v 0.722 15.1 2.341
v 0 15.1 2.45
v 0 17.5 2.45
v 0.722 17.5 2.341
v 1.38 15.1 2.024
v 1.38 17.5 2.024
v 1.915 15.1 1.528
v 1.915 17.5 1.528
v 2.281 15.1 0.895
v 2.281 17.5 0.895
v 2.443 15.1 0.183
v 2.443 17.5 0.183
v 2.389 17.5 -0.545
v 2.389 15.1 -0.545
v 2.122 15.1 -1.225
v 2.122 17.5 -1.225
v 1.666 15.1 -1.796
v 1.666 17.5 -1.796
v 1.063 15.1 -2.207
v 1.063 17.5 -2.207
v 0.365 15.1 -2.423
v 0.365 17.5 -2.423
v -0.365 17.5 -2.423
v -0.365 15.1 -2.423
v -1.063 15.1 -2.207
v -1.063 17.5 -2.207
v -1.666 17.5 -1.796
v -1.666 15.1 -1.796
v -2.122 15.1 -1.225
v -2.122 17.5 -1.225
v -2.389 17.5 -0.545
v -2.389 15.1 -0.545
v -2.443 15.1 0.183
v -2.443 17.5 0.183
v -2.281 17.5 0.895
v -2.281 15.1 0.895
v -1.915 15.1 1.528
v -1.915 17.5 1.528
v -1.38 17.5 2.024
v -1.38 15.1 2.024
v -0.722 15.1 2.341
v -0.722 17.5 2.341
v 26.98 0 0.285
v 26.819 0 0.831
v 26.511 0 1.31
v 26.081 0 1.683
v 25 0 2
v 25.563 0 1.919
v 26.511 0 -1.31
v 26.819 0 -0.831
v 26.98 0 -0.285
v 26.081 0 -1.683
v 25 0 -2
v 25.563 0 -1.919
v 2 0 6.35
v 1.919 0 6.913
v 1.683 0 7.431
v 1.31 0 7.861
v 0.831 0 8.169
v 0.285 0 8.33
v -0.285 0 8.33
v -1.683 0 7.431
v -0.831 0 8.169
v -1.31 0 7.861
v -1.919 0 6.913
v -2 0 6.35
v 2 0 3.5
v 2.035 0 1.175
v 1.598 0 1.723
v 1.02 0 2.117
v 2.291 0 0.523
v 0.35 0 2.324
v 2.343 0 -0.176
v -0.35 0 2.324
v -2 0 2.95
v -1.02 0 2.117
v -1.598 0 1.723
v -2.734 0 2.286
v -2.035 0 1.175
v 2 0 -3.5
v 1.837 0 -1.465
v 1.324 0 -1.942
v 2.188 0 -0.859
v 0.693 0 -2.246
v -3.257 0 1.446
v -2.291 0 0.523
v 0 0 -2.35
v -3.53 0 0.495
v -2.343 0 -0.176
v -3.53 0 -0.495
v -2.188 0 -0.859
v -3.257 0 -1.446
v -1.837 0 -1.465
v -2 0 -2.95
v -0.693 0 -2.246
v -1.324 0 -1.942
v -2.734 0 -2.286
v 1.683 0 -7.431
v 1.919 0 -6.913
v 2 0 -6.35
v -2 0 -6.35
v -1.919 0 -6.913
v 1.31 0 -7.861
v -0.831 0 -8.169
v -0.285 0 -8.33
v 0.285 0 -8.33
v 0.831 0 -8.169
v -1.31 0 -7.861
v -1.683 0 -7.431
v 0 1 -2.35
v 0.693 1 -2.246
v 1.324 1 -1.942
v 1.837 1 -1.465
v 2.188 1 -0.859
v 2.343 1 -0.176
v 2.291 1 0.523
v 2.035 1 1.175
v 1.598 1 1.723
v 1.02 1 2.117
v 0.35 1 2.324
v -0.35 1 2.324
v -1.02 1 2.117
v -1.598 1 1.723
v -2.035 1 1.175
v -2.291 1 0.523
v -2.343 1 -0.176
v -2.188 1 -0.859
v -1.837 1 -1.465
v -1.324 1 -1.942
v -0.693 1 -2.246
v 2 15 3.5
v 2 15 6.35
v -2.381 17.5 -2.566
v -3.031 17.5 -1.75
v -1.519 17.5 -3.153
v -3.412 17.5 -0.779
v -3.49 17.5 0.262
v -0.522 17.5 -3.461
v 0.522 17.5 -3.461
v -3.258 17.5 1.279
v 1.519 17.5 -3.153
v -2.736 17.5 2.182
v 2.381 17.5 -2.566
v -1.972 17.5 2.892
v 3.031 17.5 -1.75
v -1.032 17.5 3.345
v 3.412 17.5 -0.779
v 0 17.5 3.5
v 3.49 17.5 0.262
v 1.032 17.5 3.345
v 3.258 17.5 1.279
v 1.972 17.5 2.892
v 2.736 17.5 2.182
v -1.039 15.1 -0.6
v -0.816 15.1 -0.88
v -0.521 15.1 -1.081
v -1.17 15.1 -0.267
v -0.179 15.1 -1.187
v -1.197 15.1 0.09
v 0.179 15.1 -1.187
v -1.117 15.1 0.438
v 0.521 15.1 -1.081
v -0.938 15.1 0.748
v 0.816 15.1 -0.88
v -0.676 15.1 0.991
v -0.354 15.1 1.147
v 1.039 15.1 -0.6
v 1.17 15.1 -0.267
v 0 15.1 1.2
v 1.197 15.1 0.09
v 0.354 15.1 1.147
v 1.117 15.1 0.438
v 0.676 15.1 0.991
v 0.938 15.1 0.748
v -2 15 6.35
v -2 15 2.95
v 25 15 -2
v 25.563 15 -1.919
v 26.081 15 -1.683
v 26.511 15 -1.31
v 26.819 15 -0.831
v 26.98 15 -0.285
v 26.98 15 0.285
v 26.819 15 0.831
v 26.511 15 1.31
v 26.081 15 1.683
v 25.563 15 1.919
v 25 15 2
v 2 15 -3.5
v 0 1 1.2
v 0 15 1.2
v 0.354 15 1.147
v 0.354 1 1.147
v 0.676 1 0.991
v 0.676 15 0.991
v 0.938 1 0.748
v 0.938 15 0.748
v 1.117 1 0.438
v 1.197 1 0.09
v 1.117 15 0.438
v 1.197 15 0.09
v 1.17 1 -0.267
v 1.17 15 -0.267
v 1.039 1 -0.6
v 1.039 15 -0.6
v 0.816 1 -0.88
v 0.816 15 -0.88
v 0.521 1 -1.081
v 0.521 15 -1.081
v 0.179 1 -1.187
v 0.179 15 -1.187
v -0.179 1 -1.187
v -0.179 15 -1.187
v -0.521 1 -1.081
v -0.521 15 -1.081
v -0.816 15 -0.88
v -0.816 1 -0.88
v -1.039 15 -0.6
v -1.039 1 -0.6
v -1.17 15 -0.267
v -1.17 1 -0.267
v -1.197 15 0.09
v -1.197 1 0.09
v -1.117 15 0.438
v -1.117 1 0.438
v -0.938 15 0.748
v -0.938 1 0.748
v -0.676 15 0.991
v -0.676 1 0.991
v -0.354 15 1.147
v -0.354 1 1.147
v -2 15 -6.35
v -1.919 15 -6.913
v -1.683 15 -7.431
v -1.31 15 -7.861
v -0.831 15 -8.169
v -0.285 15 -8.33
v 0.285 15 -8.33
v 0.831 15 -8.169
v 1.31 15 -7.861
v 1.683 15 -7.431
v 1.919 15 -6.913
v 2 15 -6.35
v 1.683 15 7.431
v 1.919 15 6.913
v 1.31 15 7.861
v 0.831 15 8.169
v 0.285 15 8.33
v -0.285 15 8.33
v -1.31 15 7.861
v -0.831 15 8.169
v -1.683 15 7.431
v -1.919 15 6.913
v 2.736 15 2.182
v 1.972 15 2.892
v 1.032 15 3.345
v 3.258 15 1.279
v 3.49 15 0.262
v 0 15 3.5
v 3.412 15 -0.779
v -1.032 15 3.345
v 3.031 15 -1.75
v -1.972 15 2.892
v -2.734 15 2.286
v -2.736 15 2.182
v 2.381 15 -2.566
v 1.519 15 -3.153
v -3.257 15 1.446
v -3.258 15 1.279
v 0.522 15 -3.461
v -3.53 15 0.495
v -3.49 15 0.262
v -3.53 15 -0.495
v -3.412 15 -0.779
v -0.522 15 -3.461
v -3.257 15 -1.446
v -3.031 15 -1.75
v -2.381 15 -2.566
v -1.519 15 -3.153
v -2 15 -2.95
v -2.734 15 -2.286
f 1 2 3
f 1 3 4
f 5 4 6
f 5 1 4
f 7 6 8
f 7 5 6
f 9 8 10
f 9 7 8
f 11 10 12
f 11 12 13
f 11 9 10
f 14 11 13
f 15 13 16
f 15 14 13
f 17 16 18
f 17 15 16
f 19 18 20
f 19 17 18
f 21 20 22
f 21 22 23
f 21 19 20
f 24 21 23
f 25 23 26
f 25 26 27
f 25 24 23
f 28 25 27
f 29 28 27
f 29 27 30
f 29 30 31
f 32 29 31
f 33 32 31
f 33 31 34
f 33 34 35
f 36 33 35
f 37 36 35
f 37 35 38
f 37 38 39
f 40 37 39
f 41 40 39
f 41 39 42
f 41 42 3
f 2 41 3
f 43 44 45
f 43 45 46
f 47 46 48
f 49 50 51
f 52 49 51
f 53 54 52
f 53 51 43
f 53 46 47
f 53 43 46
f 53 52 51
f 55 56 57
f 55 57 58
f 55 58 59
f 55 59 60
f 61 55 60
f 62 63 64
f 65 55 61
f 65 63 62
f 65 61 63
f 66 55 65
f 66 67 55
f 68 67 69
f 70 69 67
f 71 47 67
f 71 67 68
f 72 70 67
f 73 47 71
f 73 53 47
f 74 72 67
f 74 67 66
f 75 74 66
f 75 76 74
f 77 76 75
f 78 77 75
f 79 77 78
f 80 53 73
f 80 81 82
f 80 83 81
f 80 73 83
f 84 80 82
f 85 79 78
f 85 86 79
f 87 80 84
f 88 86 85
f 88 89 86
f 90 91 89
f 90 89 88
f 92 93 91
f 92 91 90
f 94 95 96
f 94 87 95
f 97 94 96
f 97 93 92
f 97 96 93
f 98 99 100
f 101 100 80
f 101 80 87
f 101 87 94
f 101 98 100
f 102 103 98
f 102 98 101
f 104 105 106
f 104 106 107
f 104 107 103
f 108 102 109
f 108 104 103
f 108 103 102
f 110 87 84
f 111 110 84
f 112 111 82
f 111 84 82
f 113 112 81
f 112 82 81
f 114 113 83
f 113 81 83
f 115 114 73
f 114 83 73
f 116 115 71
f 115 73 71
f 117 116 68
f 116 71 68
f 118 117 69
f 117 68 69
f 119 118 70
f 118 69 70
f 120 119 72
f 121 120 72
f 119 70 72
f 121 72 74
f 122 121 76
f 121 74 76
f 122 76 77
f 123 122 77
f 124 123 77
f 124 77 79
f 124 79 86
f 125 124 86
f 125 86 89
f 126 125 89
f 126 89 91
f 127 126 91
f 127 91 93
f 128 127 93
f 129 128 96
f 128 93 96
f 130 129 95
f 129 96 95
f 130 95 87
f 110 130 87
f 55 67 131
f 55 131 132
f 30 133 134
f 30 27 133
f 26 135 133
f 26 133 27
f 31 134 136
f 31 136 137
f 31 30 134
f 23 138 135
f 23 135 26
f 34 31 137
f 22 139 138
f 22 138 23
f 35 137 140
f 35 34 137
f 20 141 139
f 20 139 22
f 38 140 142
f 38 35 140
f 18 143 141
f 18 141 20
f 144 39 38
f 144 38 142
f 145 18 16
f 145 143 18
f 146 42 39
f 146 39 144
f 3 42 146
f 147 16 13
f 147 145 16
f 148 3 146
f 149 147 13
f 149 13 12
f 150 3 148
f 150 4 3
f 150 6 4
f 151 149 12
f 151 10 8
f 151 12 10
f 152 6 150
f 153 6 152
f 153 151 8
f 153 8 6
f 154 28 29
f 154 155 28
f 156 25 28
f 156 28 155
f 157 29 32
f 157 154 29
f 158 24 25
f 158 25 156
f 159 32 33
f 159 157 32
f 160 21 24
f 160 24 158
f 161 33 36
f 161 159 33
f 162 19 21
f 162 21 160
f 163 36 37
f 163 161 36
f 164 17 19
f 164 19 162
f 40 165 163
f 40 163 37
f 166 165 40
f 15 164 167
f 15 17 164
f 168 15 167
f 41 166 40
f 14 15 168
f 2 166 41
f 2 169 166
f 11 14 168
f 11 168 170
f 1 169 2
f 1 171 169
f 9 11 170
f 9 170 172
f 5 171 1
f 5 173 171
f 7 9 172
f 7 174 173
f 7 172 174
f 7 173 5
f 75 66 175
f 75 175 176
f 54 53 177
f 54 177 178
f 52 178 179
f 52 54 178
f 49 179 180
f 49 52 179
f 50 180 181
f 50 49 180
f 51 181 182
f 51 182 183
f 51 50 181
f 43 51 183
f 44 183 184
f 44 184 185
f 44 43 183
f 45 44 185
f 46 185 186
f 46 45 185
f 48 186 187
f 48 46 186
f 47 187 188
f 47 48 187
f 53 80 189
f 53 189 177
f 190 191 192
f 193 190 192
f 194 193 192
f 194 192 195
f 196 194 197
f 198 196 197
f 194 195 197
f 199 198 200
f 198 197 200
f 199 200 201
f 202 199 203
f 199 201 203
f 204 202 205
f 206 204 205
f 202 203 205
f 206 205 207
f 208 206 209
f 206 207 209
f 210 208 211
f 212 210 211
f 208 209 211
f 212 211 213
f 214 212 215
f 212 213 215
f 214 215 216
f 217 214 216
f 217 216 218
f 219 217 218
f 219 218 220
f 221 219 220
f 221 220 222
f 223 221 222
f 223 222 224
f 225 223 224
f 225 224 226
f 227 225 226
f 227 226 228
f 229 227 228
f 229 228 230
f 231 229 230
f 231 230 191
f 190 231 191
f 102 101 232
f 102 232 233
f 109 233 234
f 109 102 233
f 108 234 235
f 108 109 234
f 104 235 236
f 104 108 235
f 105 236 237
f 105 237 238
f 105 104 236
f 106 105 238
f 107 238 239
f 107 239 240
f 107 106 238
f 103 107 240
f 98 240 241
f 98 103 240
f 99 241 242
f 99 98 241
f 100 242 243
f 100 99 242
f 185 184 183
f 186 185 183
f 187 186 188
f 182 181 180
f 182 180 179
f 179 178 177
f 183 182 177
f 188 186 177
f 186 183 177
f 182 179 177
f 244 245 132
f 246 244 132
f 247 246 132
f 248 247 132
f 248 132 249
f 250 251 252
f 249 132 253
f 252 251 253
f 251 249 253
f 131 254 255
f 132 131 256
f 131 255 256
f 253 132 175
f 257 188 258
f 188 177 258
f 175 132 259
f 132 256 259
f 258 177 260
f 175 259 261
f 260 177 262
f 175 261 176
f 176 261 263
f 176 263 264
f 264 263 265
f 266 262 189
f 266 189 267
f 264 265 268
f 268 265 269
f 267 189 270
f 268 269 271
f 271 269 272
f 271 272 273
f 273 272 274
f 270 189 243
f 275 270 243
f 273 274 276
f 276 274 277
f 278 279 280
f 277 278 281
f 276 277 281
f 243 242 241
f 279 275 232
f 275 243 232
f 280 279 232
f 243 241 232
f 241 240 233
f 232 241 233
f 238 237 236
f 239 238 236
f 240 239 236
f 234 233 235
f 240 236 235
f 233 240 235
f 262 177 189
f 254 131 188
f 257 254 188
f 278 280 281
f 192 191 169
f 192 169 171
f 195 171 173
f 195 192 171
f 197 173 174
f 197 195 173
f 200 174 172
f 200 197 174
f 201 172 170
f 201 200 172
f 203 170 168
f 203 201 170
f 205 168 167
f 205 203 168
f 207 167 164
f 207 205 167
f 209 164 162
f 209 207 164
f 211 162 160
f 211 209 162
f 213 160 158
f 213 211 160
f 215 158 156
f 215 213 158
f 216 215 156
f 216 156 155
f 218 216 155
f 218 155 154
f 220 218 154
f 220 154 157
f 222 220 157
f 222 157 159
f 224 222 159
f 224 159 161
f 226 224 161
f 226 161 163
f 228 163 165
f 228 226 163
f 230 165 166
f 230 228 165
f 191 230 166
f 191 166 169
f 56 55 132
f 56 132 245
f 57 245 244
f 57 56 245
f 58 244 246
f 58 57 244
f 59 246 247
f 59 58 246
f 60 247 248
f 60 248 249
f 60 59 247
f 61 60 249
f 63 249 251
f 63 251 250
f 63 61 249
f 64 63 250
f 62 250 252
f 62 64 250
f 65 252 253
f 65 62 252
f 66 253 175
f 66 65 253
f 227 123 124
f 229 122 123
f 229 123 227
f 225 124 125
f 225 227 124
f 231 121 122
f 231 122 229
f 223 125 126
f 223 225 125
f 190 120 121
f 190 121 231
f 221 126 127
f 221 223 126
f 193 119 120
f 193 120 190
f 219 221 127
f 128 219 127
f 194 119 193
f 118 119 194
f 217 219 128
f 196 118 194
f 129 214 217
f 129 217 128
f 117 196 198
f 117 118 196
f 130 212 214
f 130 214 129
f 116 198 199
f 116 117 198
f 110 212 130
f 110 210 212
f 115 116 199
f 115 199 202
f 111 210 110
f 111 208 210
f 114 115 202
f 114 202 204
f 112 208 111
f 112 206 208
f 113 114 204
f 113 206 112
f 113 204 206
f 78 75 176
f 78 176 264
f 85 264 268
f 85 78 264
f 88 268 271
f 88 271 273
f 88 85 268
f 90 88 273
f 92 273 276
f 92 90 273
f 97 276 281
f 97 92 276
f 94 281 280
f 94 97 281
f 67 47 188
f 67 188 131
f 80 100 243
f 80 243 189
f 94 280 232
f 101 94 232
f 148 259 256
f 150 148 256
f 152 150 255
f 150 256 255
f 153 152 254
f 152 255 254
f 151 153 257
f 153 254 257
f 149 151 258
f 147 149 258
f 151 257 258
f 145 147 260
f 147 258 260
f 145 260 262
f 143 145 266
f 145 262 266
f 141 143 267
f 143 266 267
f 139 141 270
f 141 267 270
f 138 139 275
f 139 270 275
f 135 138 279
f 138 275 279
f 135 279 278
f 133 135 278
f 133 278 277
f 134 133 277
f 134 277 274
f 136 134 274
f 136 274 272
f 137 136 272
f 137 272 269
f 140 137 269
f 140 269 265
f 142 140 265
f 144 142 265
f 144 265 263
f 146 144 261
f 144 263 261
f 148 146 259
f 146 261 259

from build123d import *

# Parameters (mm, degrees)
BOSS_EXTRUDE1_DEPTH = 15
SKETCH2_R           = 2.35
CUT_EXTRUDE1_DEPTH  = 1
SKETCH3_R           = 3.5
SKETCH3_R_2         = 2.45
BOSS_EXTRUDE2_DEPTH = 2.5
SKETCH4_R           = 1.2
CUT_EXTRUDE2_DEPTH  = 32.995663769
SKETCH5_R           = 2.45
SKETCH5_R_2         = 1.2
BOSS_EXTRUDE3_DEPTH = 0.1


with BuildPart() as part:
    # Sketch1 → Boss-Extrude1 (new body)
    with BuildSketch(Plane(origin=(0, 0, 0), x_dir=(1, 0, 0), z_dir=(0, 1, 0))):
        with BuildLine():
            Line((2, 6.35), (2, 3.5))
            Line((2, 3.5), (25, 2))
            ThreePointArc((25, 2), (27, 0), (25, -2))
            Line((25, -2), (2, -3.5))
            Line((2, -3.5), (2, -6.35))
            ThreePointArc((2, -6.35), (0, -8.35), (-2, -6.35))
            Line((-2, -6.35), (-2, -2.95))
            ThreePointArc((-2, -2.95), (-3.564056677, 0), (-2, 2.95))
            Line((-2, 2.95), (-2, 6.35))
            ThreePointArc((-2, 6.35), (0, 8.35), (2, 6.35))
        make_face()
    extrude(amount=BOSS_EXTRUDE1_DEPTH)

    # Sketch2 → Cut-Extrude1 (cut)
    with BuildSketch(Plane.XZ):
        with Locations(Location((0, 0, 0), (0, 0, 270))):
            Circle(SKETCH2_R)
    extrude(amount=-CUT_EXTRUDE1_DEPTH, mode=Mode.SUBTRACT)

    # Sketch3 → Boss-Extrude2 (add)
    with BuildSketch(Plane(origin=(0, 15, 0), x_dir=(1, 0, 0), z_dir=(0, 1, 0))):
        with Locations(Location((0, 0, 0), (0, 0, 270))):
            Circle(SKETCH3_R)
        with Locations(Location((0, 0, 0), (0, 0, 270))):
            Circle(SKETCH3_R_2, mode=Mode.SUBTRACT)
    extrude(amount=BOSS_EXTRUDE2_DEPTH)

    # Sketch4 → Cut-Extrude2 (cut, through all)
    with BuildSketch(Plane(origin=(0, 15, 0), x_dir=(1, 0, 0), z_dir=(0, 1, 0))):
        with Locations(Location((0, 0, 0), (0, 0, 270))):
            Circle(SKETCH4_R)
    extrude(amount=-CUT_EXTRUDE2_DEPTH, mode=Mode.SUBTRACT)

    # Sketch5 → Boss-Extrude3 (add)
    with BuildSketch(Plane(origin=(0, 15, 0), x_dir=(1, 0, 0), z_dir=(0, 1, 0))):
        with Locations(Location((0, 0, 0), (0, 0, 270))):
            Circle(SKETCH5_R)
        with Locations(Location((0, 0, 0), (0, 0, 270))):
            Circle(SKETCH5_R_2, mode=Mode.SUBTRACT)
    extrude(amount=BOSS_EXTRUDE3_DEPTH)


solid = part.part
